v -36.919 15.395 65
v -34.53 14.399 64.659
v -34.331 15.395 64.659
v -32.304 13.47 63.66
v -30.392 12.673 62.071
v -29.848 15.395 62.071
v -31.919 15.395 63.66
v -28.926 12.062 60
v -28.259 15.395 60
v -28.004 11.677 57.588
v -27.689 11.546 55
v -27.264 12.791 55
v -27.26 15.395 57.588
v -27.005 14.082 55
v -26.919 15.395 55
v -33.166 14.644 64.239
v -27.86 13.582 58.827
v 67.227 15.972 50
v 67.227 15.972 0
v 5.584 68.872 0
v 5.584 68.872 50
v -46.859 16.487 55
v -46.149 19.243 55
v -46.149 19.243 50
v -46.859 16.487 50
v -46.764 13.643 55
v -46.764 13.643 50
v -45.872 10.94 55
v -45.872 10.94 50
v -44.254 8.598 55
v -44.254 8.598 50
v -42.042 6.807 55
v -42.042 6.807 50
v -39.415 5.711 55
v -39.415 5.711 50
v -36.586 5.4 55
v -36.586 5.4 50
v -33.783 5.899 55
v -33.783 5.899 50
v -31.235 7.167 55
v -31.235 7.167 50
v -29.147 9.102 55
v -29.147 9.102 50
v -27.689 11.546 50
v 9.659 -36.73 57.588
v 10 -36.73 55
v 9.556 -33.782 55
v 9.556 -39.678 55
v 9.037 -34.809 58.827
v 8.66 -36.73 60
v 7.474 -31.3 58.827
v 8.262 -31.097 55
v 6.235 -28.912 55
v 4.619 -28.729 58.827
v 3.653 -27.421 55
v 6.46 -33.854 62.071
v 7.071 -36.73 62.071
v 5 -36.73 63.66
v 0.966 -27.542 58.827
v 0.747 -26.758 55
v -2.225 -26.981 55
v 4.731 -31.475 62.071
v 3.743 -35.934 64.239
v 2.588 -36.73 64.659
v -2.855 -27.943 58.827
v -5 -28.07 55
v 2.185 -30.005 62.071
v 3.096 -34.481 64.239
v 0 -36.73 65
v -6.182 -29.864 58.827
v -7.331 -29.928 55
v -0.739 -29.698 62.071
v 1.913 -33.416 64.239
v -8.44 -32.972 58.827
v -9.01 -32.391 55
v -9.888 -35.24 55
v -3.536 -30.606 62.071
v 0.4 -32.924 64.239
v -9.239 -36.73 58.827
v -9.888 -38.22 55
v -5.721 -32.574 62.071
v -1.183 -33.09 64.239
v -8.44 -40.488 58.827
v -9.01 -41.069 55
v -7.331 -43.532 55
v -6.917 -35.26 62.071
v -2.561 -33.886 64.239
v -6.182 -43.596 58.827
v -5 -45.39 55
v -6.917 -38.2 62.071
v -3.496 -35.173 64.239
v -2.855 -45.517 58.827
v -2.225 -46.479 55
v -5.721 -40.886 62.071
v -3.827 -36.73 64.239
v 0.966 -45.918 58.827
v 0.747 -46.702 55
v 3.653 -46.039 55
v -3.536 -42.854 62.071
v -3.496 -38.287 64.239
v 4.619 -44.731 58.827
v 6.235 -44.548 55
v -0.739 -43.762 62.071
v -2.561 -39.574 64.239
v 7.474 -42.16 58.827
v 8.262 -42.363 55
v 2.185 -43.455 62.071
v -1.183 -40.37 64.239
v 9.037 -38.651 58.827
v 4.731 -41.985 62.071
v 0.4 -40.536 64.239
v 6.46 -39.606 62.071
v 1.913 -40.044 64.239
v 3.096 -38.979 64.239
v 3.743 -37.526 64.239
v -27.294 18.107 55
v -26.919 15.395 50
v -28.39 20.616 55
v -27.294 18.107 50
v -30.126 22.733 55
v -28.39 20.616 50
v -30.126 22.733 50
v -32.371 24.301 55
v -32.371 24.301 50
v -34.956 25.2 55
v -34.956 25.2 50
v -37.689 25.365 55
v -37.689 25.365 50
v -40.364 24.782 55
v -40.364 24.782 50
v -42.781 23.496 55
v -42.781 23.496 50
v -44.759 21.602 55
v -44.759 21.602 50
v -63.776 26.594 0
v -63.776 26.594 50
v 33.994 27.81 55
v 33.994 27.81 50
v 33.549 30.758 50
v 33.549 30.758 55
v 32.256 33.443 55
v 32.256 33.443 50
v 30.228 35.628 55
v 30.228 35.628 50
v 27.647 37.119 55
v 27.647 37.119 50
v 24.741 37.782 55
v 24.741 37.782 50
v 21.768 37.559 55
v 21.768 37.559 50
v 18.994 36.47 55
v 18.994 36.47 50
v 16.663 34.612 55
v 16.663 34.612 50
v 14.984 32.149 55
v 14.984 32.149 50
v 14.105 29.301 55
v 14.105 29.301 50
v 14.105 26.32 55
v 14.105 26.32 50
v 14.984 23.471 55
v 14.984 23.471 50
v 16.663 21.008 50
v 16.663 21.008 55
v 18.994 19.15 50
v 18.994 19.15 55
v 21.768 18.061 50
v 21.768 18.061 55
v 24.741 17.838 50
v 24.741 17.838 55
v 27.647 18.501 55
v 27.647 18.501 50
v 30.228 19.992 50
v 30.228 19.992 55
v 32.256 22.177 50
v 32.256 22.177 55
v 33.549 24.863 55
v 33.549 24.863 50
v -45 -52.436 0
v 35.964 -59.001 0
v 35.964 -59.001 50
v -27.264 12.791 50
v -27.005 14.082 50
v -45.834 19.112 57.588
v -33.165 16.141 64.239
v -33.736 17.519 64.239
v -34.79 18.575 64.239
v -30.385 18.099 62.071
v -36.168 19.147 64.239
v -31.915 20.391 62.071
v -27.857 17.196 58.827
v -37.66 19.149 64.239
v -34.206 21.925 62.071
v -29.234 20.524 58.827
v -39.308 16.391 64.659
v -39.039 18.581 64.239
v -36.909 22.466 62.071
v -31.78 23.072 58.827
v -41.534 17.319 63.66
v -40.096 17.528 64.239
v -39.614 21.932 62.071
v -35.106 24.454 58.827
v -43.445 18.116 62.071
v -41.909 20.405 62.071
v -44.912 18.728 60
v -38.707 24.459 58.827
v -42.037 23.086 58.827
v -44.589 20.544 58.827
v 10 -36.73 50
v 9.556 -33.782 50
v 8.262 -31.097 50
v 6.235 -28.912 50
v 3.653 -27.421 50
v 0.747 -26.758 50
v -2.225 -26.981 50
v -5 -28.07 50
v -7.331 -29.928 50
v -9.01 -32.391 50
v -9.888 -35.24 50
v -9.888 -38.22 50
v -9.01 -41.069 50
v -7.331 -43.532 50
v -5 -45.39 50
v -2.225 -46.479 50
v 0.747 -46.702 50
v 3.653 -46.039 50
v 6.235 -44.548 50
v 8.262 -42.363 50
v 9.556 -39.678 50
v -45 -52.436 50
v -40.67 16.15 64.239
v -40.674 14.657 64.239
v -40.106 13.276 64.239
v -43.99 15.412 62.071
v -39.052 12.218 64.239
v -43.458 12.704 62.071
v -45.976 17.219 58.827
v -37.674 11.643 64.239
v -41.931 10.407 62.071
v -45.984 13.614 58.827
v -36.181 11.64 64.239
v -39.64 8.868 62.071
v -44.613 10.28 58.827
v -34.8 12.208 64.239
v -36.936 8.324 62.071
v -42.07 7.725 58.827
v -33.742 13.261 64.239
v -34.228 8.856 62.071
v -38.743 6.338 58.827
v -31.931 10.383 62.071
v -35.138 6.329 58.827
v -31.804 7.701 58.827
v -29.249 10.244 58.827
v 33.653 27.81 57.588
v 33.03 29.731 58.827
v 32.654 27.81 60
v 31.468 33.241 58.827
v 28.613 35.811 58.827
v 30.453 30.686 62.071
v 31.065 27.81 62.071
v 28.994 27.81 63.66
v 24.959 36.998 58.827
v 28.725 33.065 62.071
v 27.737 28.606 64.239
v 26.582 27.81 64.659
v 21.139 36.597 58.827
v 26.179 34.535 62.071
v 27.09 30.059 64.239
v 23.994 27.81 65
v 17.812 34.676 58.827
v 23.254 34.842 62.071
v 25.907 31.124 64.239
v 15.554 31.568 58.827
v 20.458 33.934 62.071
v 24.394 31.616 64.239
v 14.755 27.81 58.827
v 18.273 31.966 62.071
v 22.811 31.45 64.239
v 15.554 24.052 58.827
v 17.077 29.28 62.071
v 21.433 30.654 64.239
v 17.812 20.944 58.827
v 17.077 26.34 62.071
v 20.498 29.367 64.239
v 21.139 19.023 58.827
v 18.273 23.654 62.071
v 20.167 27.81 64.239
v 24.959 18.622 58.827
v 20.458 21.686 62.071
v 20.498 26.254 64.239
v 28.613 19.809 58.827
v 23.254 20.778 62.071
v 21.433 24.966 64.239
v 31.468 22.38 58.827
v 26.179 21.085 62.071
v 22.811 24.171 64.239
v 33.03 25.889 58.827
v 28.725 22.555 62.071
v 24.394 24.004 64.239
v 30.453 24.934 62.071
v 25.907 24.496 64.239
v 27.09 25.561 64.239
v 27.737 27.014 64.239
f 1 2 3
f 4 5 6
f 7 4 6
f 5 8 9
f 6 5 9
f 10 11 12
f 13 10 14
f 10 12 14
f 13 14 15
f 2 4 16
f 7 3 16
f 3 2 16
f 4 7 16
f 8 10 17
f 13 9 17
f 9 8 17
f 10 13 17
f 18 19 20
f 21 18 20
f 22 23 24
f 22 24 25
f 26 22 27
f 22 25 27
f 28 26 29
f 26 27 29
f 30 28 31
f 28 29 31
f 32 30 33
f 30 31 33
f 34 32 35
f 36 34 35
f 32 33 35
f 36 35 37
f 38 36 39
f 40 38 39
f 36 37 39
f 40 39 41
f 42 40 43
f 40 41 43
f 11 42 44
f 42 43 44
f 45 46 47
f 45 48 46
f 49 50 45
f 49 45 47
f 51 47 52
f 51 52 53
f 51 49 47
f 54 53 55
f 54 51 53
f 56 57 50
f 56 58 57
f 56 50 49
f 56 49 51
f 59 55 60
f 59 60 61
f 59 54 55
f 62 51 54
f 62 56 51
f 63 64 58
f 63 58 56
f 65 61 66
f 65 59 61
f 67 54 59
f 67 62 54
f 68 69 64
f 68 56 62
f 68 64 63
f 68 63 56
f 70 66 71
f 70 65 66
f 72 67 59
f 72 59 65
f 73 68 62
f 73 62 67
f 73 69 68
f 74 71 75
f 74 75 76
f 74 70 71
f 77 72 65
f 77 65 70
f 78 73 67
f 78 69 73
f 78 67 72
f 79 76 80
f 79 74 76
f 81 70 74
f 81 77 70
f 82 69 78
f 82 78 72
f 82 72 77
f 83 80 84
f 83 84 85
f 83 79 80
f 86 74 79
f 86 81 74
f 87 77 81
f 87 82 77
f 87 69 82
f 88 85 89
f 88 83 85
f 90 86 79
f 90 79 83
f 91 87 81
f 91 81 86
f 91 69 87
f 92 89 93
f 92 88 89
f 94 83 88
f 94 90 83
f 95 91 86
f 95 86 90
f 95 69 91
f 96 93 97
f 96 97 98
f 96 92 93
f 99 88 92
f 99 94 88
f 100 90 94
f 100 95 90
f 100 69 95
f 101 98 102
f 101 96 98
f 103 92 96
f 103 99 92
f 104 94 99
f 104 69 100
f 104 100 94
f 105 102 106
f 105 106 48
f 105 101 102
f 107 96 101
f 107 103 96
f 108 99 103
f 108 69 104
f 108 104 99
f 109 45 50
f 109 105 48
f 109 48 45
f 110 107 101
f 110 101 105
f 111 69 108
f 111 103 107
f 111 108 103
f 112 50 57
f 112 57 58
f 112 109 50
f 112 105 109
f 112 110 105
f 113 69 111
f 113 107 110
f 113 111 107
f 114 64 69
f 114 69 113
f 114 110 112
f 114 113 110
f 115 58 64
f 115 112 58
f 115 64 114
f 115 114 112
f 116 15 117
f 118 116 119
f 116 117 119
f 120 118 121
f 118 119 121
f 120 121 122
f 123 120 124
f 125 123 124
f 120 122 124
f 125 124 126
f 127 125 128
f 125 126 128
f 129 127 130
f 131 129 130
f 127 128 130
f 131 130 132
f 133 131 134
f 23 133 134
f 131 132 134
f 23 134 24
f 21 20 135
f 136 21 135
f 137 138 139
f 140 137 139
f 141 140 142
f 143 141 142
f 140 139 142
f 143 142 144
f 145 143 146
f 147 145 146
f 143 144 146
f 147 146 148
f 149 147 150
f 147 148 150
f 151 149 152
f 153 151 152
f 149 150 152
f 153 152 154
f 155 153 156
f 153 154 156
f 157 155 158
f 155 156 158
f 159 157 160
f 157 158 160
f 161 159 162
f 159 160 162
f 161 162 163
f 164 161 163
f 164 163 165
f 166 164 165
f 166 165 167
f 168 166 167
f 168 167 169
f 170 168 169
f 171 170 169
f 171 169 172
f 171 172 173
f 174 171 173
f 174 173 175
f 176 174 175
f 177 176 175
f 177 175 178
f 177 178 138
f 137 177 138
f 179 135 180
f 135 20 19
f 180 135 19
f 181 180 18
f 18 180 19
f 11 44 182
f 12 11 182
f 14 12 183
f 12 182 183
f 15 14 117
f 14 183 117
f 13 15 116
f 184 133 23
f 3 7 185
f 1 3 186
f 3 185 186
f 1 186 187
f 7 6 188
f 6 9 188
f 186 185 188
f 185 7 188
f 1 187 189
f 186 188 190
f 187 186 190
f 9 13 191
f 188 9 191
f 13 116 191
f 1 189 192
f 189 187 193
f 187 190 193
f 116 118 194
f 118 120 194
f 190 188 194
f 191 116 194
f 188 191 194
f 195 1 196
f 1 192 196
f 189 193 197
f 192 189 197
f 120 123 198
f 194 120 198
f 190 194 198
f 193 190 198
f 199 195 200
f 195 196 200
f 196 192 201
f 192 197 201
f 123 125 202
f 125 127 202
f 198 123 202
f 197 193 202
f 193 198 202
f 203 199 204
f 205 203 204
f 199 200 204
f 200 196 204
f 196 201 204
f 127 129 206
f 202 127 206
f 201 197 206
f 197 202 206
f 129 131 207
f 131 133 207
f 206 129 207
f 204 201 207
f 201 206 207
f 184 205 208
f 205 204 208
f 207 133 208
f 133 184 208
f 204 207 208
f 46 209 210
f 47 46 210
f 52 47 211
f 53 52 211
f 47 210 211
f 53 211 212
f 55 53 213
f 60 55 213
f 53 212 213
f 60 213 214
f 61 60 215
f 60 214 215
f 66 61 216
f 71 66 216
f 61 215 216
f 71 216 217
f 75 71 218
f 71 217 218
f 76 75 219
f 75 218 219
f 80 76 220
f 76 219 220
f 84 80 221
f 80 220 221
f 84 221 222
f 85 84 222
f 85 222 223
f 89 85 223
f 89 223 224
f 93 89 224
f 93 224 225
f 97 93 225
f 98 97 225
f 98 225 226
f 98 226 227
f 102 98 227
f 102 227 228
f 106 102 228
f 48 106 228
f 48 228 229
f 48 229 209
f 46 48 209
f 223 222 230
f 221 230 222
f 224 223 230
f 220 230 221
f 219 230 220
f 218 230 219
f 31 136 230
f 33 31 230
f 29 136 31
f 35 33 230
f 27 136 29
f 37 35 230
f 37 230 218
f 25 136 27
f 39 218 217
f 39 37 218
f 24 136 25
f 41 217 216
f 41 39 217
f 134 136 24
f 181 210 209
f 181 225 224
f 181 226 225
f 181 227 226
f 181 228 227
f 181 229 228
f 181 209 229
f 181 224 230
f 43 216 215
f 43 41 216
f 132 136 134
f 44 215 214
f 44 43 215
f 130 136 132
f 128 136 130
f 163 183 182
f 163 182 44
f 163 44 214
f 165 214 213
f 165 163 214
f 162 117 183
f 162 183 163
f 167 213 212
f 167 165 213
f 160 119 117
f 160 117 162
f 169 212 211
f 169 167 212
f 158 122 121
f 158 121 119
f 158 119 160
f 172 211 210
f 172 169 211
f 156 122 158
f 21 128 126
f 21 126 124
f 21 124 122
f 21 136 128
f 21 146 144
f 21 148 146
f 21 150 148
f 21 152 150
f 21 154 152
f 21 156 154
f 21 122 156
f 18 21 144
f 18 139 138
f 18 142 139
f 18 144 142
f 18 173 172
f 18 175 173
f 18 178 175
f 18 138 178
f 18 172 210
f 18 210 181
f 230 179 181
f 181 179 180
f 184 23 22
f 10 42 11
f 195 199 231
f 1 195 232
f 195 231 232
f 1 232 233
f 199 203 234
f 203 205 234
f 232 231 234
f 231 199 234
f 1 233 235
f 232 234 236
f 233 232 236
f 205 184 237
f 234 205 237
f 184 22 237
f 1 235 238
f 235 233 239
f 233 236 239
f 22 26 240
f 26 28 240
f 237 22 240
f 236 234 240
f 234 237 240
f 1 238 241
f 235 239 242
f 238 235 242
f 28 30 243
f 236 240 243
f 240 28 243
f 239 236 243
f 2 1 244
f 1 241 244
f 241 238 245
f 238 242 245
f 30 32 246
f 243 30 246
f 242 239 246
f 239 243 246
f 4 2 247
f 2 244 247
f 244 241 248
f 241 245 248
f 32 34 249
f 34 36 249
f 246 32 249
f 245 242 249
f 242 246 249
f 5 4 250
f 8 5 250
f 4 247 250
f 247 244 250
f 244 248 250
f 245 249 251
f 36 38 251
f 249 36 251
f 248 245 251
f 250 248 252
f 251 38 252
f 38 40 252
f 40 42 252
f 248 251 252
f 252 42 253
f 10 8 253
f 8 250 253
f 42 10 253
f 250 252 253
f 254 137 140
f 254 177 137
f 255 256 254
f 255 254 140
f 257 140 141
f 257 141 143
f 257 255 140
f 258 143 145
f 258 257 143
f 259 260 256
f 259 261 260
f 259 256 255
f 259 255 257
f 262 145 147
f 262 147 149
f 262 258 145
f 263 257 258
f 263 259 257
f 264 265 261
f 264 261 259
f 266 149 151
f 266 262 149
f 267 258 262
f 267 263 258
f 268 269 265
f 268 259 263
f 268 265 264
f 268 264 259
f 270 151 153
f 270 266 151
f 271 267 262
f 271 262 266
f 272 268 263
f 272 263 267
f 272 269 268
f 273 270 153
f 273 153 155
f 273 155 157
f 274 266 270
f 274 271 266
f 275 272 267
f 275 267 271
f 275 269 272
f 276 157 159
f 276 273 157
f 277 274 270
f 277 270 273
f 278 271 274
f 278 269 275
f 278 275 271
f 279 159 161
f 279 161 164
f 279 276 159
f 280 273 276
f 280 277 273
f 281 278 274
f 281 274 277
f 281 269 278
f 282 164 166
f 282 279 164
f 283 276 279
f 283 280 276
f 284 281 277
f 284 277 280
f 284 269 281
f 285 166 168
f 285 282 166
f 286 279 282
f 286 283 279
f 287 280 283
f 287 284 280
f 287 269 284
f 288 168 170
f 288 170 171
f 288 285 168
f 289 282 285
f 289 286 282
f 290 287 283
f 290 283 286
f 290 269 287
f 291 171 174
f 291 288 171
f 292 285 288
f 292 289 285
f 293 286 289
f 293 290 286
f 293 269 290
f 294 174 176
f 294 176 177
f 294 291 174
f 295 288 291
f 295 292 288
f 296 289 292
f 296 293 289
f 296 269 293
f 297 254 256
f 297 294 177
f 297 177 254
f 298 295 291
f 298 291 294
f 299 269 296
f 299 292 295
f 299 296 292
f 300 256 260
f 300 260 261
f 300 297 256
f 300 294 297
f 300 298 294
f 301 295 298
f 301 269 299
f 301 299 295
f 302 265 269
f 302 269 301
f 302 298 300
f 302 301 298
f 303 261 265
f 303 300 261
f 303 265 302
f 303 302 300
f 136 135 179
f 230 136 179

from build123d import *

# Parameters (mm, degrees)
F0_R     = 10
F1_DEPTH = 50
F2_DEPTH = 65
F3_R     = 10


with BuildPart() as f1:
    # F0 (on Top) → F1 (new body)
    with BuildSketch(Plane.XY):
        Polygon((35.9642069631, -59.0012792924), (67.2271022816, 15.9715953944), (5.5844272121, 68.8722681007), (-63.7757364568, 26.5938071741), (-45, -52.4363913769), align=None)
        with Locations((0, -36.73)):
            Circle(F0_R, mode=Mode.SUBTRACT)
        with BuildLine():
            ThreePointArc((-27.689133859, 11.5460757896), (-40.7675370752, 6.1650564331), (-46.1485564317, 19.2434596493))
            ThreePointArc((-46.1485564317, 19.2434596493), (-34.9563356375, 25.2003047486), (-26.9188451453, 15.3947677194))
            ThreePointArc((-26.9188451453, 15.3947677194), (-27.1133081161, 13.4322582116), (-27.689133859, 11.5460757896))
        make_face(mode=Mode.SUBTRACT)
        with Locations((23.9935845951, 27.8100844709)):
            Circle(F0_R, mode=Mode.SUBTRACT)
    extrude(amount=F1_DEPTH)

    # F0 (on Top) → F2 (join)
    with BuildSketch(Plane.XY):
        with BuildLine():
            Line((-27.689133859, 11.5460757896), (-46.1485564317, 19.2434596493))
            ThreePointArc((-46.1485564317, 19.2434596493), (-40.7675370752, 6.1650564331), (-27.689133859, 11.5460757896))
        make_face()
        with BuildLine():
            ThreePointArc((-26.9188451453, 15.3947677194), (-34.9563356375, 25.2003047486), (-46.1485564317, 19.2434596493))
            Line((-46.1485564317, 19.2434596493), (-27.689133859, 11.5460757896))
            ThreePointArc((-27.689133859, 11.5460757896), (-27.1133081161, 13.4322582116), (-26.9188451453, 15.3947677194))
        make_face()
        with Locations((23.9935845951, 27.8100844709)):
            Circle(F0_R)
        with Locations((0, -36.73)):
            Circle(F0_R)
    extrude(amount=F2_DEPTH)

    # F3
    f3_edges = [f1.edges().sort_by_distance(p)[0] for p in [
        (-46.148556, 19.24346, 65),
        (-10, -36.73, 65),
        (13.993585, 27.810084, 65),
    ]]
    fillet(f3_edges, radius=F3_R)


solid = f1.part
